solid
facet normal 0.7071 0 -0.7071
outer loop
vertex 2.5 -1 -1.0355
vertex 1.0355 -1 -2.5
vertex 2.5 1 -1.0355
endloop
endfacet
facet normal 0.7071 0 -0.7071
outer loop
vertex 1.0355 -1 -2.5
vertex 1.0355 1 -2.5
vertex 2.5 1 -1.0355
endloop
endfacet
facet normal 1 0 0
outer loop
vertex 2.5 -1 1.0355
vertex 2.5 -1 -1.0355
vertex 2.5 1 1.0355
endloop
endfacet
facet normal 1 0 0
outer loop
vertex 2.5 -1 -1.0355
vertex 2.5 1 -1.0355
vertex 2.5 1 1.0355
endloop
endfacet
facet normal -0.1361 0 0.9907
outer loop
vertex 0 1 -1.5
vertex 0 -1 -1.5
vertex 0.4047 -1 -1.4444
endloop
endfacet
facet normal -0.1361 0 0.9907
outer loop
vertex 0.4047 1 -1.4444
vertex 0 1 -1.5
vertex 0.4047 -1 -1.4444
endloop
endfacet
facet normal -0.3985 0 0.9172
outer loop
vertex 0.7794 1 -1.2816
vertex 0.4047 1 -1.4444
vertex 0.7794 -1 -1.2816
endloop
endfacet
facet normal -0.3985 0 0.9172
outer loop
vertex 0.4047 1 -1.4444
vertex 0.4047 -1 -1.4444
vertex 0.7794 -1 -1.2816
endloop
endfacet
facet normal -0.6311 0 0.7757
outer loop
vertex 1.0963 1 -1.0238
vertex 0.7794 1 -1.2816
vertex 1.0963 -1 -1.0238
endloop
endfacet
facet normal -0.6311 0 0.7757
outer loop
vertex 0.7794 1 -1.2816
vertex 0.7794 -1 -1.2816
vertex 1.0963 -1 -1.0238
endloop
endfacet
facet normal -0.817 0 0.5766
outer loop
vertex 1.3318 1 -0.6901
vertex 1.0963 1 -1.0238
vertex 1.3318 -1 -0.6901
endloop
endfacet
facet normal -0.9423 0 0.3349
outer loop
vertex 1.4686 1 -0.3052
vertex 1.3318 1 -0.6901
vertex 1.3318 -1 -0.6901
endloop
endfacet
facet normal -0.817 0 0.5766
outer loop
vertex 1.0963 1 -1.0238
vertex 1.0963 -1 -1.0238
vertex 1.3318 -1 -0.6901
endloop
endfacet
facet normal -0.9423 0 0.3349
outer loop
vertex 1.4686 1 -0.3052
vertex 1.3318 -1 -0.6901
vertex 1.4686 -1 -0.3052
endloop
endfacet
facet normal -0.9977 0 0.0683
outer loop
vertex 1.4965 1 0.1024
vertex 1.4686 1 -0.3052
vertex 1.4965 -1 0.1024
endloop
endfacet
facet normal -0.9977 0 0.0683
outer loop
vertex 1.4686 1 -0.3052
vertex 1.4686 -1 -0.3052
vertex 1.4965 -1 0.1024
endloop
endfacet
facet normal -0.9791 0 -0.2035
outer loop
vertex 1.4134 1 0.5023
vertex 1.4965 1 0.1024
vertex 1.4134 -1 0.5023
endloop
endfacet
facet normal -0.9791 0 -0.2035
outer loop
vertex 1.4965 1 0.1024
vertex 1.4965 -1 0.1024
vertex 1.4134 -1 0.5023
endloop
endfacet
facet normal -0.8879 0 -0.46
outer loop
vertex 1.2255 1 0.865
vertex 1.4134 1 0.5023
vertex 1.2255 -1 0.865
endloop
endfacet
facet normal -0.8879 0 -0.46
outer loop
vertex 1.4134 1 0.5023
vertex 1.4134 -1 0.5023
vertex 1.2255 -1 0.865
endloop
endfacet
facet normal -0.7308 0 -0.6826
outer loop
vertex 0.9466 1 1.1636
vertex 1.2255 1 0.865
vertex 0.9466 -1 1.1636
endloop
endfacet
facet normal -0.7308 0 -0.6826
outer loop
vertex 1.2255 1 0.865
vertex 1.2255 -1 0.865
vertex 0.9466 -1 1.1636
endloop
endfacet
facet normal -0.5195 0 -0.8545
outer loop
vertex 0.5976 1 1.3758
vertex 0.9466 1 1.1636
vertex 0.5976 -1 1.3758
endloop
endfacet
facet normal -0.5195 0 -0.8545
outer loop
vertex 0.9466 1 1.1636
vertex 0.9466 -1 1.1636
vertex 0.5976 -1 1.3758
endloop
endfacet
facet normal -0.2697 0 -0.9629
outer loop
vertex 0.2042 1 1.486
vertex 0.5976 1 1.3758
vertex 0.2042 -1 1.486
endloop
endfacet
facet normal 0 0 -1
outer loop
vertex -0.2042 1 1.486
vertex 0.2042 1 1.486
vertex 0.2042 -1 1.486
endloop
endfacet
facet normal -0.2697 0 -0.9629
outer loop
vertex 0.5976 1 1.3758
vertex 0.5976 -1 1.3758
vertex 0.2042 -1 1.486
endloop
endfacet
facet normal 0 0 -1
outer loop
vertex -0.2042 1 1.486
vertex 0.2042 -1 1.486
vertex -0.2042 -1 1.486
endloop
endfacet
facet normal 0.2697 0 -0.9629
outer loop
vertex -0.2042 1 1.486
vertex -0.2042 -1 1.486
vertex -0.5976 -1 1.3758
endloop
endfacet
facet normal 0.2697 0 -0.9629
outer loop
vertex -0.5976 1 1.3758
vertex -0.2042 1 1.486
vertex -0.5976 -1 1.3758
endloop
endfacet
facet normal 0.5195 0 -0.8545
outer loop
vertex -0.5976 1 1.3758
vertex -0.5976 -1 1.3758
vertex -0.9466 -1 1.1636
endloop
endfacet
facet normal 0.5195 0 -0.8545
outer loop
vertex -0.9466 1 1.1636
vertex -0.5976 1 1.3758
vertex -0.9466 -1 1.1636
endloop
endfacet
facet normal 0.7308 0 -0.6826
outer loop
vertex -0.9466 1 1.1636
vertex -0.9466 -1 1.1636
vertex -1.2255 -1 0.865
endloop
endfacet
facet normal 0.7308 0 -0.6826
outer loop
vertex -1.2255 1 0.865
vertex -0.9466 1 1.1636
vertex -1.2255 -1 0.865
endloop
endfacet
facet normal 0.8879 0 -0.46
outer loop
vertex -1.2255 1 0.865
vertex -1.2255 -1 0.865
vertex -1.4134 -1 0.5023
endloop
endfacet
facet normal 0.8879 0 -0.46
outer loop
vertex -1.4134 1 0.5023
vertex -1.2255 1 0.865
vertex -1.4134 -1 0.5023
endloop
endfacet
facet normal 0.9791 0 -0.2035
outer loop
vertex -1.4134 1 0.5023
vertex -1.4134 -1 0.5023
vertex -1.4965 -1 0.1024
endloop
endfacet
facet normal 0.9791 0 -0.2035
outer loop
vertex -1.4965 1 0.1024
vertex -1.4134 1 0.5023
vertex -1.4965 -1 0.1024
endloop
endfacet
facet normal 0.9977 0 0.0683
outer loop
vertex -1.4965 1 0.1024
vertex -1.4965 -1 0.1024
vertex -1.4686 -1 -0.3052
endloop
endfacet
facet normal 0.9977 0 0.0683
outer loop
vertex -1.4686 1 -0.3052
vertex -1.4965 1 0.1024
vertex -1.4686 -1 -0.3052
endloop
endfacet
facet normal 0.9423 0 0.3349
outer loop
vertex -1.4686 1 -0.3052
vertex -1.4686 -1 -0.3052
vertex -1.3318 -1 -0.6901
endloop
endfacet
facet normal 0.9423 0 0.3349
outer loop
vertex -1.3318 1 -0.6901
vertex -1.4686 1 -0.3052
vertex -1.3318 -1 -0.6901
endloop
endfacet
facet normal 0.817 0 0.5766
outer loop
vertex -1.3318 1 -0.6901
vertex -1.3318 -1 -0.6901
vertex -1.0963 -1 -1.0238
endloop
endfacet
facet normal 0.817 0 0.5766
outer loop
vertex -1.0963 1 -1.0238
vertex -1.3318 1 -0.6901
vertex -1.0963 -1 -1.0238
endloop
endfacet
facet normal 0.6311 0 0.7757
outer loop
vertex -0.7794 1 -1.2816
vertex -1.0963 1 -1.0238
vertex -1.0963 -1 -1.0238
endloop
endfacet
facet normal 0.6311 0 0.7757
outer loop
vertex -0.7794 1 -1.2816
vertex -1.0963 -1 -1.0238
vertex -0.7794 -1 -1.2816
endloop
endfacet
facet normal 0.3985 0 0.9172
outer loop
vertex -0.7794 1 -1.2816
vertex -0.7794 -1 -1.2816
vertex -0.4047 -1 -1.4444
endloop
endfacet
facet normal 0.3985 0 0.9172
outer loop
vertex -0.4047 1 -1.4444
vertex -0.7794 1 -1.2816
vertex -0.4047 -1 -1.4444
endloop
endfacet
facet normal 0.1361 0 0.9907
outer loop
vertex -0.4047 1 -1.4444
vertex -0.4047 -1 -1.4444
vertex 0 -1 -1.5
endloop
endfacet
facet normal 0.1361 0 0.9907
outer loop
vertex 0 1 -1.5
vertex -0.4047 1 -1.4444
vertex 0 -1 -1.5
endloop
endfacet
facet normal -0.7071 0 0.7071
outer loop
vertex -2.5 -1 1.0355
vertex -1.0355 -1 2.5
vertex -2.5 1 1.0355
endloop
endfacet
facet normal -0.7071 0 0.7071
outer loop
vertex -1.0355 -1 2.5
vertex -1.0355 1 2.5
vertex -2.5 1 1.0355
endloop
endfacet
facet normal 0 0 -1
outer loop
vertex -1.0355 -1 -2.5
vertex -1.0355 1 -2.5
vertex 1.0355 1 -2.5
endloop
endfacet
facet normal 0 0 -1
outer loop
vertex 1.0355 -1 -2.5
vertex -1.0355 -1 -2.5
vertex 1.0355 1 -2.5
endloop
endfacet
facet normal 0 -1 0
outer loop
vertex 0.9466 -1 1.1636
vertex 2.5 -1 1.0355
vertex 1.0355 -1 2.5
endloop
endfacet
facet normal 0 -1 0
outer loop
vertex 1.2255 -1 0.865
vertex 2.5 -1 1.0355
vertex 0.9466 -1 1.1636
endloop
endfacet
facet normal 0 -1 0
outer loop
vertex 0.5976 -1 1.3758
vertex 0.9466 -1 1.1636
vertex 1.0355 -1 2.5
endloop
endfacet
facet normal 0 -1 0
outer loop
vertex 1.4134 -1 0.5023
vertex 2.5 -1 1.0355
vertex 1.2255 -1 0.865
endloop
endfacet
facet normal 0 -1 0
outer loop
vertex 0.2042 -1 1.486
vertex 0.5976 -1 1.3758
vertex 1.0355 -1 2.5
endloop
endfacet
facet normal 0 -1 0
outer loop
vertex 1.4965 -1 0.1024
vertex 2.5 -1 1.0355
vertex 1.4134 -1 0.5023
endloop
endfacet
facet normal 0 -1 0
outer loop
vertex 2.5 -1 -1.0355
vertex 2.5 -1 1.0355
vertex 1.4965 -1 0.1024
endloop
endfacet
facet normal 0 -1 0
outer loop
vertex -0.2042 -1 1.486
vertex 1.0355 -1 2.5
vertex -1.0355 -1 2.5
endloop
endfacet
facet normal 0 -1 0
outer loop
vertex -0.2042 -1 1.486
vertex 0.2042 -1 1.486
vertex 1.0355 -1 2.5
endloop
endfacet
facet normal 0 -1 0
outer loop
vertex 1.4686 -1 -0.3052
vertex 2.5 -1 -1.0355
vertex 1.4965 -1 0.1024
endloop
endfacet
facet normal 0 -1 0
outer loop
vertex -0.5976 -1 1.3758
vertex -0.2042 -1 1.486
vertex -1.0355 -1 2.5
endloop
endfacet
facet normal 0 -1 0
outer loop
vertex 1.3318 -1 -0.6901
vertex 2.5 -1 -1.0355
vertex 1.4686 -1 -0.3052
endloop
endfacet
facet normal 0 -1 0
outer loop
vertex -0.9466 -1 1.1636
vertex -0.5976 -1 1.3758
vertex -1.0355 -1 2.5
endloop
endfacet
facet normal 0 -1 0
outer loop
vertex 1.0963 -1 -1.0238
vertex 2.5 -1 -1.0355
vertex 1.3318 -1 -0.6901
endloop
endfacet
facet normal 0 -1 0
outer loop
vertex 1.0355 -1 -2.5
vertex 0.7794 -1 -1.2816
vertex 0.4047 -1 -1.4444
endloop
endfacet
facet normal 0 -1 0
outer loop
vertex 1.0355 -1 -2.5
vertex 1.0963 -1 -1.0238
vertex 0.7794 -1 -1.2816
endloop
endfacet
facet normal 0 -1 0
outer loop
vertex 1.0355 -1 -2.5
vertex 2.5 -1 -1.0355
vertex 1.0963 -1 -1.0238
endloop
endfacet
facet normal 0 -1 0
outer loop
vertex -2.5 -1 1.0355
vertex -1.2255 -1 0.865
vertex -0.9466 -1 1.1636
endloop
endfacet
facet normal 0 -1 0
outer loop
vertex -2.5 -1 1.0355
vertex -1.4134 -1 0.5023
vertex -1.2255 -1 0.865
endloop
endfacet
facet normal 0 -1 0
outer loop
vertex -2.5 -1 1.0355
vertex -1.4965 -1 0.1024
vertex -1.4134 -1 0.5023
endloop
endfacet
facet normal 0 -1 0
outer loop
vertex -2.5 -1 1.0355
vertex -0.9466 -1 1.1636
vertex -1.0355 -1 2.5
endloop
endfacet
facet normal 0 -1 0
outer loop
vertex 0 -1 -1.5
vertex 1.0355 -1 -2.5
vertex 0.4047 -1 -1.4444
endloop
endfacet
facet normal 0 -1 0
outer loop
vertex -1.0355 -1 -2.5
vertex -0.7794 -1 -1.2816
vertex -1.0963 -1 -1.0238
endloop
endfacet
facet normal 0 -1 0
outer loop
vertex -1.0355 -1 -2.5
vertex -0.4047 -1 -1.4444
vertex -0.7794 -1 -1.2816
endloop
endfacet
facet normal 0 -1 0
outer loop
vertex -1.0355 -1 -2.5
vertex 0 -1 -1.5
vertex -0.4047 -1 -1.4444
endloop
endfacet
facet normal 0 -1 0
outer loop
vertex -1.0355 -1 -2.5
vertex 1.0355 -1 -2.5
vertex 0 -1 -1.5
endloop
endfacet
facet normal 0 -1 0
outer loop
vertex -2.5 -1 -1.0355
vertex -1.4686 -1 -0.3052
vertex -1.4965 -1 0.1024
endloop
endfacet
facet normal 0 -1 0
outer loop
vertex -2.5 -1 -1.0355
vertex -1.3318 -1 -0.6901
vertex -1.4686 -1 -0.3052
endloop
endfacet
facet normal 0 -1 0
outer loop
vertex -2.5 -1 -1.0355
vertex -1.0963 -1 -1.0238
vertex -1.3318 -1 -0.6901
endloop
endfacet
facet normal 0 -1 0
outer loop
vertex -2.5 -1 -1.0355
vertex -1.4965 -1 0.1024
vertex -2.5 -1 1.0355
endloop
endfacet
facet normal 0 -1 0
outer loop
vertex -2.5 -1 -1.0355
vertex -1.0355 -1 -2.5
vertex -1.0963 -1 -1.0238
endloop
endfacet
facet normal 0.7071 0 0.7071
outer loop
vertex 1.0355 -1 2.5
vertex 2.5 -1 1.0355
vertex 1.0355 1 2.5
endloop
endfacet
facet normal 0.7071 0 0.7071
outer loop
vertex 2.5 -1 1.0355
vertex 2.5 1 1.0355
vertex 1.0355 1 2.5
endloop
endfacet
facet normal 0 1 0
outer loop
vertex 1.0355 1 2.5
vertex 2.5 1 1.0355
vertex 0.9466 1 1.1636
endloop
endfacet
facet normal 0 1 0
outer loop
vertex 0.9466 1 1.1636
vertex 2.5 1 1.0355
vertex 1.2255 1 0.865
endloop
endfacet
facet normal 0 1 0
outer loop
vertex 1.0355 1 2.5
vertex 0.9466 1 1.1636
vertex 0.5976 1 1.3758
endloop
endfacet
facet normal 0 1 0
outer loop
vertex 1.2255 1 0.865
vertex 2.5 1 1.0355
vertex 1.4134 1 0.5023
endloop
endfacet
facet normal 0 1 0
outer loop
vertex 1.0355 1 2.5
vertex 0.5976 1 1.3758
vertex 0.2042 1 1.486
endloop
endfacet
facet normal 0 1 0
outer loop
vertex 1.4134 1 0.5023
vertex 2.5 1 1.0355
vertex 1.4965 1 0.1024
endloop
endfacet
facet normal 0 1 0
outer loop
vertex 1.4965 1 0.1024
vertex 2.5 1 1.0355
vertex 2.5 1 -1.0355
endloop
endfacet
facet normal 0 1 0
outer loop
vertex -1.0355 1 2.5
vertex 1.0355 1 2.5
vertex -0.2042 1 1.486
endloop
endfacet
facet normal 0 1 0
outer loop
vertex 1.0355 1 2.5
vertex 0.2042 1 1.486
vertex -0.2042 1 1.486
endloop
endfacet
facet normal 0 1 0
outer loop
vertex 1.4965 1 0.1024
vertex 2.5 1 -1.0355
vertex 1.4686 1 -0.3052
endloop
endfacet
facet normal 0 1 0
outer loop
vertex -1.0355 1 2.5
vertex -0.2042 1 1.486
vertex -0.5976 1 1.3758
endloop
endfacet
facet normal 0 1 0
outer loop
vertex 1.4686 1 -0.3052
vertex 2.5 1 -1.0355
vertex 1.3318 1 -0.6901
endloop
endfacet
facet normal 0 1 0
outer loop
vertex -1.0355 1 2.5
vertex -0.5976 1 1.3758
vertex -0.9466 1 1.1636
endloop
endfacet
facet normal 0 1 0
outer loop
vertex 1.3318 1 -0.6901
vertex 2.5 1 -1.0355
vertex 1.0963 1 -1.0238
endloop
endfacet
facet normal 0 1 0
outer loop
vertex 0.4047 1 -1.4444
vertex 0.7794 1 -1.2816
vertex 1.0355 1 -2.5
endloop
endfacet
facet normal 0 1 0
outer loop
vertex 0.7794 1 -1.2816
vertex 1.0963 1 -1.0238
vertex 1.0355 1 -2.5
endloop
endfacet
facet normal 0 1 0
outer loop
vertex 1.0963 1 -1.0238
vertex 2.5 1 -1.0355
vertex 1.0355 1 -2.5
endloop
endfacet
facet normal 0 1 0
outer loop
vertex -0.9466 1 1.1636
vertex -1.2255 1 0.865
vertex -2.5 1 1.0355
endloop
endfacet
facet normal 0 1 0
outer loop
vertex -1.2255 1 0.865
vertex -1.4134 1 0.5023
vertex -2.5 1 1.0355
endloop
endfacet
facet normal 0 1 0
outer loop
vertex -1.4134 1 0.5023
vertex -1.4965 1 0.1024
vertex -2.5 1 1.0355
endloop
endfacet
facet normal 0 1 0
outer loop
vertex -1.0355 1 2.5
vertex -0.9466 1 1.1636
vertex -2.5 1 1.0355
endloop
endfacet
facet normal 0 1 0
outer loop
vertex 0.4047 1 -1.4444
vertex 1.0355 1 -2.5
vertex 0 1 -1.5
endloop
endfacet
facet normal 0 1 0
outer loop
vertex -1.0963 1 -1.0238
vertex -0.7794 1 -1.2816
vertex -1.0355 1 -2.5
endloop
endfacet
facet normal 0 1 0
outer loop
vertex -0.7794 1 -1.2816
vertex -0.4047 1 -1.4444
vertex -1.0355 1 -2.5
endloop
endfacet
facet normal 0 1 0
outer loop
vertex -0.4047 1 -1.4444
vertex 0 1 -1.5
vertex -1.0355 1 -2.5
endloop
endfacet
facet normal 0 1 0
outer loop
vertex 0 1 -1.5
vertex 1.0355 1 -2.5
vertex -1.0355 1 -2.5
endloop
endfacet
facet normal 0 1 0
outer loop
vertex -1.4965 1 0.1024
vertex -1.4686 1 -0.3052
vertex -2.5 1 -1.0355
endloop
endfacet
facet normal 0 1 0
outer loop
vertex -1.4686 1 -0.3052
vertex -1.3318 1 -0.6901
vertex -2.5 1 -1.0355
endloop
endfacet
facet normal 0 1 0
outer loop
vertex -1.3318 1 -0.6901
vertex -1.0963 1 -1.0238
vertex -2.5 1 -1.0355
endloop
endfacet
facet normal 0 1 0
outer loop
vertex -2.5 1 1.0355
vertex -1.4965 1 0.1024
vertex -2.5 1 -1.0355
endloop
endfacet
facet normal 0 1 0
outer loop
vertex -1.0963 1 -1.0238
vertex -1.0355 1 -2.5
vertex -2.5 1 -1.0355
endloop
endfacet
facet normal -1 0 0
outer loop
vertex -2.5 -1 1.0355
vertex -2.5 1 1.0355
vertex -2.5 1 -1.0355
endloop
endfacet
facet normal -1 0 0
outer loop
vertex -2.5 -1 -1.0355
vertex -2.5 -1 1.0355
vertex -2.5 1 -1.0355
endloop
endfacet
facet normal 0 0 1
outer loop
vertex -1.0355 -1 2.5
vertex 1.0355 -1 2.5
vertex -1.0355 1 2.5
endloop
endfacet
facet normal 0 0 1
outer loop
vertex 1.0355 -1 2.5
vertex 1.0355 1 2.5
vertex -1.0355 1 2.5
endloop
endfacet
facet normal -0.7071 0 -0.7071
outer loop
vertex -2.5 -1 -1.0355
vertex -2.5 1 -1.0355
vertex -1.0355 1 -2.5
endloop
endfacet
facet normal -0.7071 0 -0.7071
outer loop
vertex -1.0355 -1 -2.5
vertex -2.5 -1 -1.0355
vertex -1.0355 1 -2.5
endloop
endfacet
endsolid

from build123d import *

# Parameters (mm, degrees)
EXTRUSION1_DEPTH        = 1
ESQUISSE3_R             = 1.5
ENL_V_MAT_EXTRU_1_DEPTH = 5.062019202


with BuildPart() as part:
    # Esquisse1 → Extrusion1 (new, symmetric)
    with BuildSketch(Plane(origin=(0, 0, 0), x_dir=(1, 0, 0), z_dir=(0, 1, 0))):
        Polygon((-1.035533906, 2.5), (1.035533906, 2.5), (2.5, 1.035533906), (2.5, -1.035533906), (1.035533906, -2.5), (-1.035533906, -2.5), (-2.5, -1.035533906), (-2.5, 1.035533906), align=None)
    extrude(amount=EXTRUSION1_DEPTH, both=True)

    # Esquisse3 → Enlèv. mat.-Extru.1 (cut, through all)
    with BuildSketch(Plane.XZ.offset(1)):
        with Locations(Location((0, 0, 0), (0, 0, 270))):
            Circle(ESQUISSE3_R)
    extrude(amount=-ENL_V_MAT_EXTRU_1_DEPTH, mode=Mode.SUBTRACT)


solid = part.part
